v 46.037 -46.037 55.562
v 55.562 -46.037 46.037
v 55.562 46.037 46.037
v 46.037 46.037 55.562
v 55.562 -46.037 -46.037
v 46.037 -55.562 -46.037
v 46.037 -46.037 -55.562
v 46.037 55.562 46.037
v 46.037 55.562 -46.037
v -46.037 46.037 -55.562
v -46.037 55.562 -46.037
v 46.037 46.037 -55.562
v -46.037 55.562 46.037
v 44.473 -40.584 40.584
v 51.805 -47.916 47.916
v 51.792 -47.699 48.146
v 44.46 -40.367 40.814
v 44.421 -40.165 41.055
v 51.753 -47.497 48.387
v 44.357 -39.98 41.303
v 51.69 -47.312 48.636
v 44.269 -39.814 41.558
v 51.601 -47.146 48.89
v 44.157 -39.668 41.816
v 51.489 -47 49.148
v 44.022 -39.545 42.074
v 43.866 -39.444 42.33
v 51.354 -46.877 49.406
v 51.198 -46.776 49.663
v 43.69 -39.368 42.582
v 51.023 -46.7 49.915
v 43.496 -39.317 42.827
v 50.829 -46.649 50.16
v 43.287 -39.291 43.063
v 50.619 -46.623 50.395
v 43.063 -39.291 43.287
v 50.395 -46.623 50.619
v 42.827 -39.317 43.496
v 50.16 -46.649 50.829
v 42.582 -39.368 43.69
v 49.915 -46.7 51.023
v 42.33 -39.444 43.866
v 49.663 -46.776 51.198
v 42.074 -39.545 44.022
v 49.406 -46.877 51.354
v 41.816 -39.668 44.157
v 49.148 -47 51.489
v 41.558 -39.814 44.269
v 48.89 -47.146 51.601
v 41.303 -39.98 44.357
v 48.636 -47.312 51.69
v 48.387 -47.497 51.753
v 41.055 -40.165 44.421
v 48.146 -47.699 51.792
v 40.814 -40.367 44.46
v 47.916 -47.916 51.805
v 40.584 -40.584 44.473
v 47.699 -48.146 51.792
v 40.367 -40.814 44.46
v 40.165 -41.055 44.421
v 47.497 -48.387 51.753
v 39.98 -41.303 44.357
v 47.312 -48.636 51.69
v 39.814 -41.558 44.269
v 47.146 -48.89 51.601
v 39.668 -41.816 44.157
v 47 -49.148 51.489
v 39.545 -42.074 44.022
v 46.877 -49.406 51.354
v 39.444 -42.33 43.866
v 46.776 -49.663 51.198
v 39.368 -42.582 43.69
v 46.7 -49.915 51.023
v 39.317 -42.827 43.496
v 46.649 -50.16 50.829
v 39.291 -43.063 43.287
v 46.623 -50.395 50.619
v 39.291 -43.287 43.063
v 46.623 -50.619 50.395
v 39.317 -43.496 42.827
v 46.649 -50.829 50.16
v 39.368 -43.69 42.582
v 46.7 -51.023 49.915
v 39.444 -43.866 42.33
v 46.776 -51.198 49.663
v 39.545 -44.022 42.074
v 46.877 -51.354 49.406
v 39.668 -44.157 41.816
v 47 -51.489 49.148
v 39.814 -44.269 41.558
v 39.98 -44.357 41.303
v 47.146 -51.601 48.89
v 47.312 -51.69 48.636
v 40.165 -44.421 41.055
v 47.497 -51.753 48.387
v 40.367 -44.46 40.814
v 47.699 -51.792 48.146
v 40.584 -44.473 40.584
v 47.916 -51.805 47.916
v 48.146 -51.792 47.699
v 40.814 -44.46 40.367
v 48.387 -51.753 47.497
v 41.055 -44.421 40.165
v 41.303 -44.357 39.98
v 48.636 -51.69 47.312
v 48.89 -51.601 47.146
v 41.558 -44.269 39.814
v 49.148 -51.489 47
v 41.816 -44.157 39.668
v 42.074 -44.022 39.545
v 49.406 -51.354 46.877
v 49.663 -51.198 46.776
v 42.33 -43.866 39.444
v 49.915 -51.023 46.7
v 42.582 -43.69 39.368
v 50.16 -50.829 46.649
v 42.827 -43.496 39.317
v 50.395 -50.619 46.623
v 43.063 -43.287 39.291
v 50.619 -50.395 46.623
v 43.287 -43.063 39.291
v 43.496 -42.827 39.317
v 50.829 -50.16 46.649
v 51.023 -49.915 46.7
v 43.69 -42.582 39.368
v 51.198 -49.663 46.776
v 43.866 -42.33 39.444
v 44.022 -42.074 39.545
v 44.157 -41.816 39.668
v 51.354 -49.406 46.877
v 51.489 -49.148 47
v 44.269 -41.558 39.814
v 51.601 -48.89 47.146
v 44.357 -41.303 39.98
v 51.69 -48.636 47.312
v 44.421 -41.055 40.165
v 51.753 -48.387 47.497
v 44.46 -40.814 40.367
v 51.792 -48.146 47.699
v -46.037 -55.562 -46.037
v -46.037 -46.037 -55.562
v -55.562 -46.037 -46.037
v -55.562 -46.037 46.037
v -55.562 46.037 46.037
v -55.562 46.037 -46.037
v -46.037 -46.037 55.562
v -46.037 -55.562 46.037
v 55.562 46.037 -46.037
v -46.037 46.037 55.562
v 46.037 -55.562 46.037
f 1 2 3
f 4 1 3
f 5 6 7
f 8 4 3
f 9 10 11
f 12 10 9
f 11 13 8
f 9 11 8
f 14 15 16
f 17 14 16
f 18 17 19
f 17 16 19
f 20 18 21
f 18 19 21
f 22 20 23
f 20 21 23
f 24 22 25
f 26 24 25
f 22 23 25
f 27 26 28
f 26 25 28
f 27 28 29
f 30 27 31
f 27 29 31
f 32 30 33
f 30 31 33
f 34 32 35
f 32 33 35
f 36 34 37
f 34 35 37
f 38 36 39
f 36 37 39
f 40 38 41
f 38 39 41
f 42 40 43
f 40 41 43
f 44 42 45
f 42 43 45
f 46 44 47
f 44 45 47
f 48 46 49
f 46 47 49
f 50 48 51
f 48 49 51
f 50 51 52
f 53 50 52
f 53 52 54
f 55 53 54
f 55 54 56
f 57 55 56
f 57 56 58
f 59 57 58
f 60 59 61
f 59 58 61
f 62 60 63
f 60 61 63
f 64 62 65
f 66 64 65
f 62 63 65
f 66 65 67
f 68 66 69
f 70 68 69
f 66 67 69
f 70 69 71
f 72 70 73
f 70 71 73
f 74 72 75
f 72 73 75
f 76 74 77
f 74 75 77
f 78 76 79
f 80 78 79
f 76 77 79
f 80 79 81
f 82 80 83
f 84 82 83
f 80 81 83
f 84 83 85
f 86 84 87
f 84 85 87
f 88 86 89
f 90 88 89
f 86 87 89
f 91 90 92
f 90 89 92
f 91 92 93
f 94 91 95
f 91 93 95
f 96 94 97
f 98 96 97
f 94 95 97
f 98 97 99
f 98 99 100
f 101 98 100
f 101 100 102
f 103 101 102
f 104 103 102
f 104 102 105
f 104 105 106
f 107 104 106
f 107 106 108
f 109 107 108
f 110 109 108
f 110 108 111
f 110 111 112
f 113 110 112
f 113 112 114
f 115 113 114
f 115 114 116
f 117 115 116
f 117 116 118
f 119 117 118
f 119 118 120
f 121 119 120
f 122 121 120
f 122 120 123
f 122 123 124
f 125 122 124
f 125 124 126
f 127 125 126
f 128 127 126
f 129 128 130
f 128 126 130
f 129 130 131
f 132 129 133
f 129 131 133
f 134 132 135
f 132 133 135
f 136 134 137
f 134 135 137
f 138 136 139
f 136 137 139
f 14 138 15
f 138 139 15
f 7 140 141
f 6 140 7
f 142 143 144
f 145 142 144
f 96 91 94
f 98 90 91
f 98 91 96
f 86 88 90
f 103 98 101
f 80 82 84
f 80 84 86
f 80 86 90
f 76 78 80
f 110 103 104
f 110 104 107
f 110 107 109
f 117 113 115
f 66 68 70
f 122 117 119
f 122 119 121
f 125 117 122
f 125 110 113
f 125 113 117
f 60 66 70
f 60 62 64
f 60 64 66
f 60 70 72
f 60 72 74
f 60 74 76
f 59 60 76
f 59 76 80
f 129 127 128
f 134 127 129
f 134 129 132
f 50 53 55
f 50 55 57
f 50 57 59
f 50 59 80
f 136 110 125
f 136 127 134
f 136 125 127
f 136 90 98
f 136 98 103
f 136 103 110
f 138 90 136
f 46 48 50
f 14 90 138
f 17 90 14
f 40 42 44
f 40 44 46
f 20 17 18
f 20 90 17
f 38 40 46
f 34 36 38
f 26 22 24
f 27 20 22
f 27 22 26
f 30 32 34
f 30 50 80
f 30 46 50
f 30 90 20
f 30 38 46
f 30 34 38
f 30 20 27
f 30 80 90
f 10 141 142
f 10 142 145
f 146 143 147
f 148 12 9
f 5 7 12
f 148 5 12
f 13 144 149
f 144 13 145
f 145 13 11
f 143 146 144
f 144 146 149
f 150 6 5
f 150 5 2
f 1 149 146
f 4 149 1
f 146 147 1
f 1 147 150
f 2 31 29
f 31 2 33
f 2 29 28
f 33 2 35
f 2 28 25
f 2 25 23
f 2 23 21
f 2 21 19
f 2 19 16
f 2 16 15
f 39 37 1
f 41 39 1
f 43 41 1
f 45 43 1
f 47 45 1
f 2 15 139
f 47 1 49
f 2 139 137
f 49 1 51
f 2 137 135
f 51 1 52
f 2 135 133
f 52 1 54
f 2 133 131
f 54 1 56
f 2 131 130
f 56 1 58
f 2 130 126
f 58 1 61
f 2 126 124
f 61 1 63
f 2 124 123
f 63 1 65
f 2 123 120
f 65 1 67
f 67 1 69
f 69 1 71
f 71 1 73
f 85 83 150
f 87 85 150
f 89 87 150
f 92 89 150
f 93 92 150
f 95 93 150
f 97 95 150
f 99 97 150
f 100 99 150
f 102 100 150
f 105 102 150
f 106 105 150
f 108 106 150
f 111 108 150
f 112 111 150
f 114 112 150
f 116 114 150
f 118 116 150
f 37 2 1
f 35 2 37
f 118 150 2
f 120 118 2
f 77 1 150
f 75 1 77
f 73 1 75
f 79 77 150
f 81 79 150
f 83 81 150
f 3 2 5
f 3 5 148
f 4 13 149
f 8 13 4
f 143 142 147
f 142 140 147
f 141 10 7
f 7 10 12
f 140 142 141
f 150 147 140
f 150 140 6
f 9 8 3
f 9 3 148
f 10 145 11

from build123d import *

# Parameters (mm, degrees)
F0_W     = 111.125
F0_H     = 111.125
F1_DEPTH = 55.5625
F2_SIZE  = 9.525
F3_R     = 3.175
F4_DEPTH = 12.7


with BuildPart() as f1:
    # F0 (on Top) → F1 (new body, symmetric)
    with BuildSketch(Plane.XY):
        Rectangle(F0_W, F0_H)
    extrude(amount=F1_DEPTH, both=True)

    # F2
    f2_edges = [f1.edges().sort_by_distance(p)[0] for p in [
        (-55.5625, 0, 55.5625),
        (-55.5625, 55.5625, 0),
        (-55.5625, -55.5625, 0),
        (-55.5625, 0, -55.5625),
        (0, -55.5625, -55.5625),
        (0, 55.5625, -55.5625),
        (0, 55.5625, 55.5625),
        (0, -55.5625, 55.5625),
        (55.5625, 0, 55.5625),
        (55.5625, -55.5625, 0),
        (55.5625, 0, -55.5625),
        (55.5625, 55.5625, 0),
    ]]
    chamfer(f2_edges, length=F2_SIZE)

    # F3 (on face) → F4 (cut)
    with BuildSketch(Plane(origin=(49.2125, -49.2125, 49.2125), x_dir=(0.816497, 0.408248, -0.408248), z_dir=(0.57735, -0.57735, 0.57735))):
        Circle(F3_R)
    extrude(amount=-F4_DEPTH, mode=Mode.SUBTRACT)


solid = f1.part
